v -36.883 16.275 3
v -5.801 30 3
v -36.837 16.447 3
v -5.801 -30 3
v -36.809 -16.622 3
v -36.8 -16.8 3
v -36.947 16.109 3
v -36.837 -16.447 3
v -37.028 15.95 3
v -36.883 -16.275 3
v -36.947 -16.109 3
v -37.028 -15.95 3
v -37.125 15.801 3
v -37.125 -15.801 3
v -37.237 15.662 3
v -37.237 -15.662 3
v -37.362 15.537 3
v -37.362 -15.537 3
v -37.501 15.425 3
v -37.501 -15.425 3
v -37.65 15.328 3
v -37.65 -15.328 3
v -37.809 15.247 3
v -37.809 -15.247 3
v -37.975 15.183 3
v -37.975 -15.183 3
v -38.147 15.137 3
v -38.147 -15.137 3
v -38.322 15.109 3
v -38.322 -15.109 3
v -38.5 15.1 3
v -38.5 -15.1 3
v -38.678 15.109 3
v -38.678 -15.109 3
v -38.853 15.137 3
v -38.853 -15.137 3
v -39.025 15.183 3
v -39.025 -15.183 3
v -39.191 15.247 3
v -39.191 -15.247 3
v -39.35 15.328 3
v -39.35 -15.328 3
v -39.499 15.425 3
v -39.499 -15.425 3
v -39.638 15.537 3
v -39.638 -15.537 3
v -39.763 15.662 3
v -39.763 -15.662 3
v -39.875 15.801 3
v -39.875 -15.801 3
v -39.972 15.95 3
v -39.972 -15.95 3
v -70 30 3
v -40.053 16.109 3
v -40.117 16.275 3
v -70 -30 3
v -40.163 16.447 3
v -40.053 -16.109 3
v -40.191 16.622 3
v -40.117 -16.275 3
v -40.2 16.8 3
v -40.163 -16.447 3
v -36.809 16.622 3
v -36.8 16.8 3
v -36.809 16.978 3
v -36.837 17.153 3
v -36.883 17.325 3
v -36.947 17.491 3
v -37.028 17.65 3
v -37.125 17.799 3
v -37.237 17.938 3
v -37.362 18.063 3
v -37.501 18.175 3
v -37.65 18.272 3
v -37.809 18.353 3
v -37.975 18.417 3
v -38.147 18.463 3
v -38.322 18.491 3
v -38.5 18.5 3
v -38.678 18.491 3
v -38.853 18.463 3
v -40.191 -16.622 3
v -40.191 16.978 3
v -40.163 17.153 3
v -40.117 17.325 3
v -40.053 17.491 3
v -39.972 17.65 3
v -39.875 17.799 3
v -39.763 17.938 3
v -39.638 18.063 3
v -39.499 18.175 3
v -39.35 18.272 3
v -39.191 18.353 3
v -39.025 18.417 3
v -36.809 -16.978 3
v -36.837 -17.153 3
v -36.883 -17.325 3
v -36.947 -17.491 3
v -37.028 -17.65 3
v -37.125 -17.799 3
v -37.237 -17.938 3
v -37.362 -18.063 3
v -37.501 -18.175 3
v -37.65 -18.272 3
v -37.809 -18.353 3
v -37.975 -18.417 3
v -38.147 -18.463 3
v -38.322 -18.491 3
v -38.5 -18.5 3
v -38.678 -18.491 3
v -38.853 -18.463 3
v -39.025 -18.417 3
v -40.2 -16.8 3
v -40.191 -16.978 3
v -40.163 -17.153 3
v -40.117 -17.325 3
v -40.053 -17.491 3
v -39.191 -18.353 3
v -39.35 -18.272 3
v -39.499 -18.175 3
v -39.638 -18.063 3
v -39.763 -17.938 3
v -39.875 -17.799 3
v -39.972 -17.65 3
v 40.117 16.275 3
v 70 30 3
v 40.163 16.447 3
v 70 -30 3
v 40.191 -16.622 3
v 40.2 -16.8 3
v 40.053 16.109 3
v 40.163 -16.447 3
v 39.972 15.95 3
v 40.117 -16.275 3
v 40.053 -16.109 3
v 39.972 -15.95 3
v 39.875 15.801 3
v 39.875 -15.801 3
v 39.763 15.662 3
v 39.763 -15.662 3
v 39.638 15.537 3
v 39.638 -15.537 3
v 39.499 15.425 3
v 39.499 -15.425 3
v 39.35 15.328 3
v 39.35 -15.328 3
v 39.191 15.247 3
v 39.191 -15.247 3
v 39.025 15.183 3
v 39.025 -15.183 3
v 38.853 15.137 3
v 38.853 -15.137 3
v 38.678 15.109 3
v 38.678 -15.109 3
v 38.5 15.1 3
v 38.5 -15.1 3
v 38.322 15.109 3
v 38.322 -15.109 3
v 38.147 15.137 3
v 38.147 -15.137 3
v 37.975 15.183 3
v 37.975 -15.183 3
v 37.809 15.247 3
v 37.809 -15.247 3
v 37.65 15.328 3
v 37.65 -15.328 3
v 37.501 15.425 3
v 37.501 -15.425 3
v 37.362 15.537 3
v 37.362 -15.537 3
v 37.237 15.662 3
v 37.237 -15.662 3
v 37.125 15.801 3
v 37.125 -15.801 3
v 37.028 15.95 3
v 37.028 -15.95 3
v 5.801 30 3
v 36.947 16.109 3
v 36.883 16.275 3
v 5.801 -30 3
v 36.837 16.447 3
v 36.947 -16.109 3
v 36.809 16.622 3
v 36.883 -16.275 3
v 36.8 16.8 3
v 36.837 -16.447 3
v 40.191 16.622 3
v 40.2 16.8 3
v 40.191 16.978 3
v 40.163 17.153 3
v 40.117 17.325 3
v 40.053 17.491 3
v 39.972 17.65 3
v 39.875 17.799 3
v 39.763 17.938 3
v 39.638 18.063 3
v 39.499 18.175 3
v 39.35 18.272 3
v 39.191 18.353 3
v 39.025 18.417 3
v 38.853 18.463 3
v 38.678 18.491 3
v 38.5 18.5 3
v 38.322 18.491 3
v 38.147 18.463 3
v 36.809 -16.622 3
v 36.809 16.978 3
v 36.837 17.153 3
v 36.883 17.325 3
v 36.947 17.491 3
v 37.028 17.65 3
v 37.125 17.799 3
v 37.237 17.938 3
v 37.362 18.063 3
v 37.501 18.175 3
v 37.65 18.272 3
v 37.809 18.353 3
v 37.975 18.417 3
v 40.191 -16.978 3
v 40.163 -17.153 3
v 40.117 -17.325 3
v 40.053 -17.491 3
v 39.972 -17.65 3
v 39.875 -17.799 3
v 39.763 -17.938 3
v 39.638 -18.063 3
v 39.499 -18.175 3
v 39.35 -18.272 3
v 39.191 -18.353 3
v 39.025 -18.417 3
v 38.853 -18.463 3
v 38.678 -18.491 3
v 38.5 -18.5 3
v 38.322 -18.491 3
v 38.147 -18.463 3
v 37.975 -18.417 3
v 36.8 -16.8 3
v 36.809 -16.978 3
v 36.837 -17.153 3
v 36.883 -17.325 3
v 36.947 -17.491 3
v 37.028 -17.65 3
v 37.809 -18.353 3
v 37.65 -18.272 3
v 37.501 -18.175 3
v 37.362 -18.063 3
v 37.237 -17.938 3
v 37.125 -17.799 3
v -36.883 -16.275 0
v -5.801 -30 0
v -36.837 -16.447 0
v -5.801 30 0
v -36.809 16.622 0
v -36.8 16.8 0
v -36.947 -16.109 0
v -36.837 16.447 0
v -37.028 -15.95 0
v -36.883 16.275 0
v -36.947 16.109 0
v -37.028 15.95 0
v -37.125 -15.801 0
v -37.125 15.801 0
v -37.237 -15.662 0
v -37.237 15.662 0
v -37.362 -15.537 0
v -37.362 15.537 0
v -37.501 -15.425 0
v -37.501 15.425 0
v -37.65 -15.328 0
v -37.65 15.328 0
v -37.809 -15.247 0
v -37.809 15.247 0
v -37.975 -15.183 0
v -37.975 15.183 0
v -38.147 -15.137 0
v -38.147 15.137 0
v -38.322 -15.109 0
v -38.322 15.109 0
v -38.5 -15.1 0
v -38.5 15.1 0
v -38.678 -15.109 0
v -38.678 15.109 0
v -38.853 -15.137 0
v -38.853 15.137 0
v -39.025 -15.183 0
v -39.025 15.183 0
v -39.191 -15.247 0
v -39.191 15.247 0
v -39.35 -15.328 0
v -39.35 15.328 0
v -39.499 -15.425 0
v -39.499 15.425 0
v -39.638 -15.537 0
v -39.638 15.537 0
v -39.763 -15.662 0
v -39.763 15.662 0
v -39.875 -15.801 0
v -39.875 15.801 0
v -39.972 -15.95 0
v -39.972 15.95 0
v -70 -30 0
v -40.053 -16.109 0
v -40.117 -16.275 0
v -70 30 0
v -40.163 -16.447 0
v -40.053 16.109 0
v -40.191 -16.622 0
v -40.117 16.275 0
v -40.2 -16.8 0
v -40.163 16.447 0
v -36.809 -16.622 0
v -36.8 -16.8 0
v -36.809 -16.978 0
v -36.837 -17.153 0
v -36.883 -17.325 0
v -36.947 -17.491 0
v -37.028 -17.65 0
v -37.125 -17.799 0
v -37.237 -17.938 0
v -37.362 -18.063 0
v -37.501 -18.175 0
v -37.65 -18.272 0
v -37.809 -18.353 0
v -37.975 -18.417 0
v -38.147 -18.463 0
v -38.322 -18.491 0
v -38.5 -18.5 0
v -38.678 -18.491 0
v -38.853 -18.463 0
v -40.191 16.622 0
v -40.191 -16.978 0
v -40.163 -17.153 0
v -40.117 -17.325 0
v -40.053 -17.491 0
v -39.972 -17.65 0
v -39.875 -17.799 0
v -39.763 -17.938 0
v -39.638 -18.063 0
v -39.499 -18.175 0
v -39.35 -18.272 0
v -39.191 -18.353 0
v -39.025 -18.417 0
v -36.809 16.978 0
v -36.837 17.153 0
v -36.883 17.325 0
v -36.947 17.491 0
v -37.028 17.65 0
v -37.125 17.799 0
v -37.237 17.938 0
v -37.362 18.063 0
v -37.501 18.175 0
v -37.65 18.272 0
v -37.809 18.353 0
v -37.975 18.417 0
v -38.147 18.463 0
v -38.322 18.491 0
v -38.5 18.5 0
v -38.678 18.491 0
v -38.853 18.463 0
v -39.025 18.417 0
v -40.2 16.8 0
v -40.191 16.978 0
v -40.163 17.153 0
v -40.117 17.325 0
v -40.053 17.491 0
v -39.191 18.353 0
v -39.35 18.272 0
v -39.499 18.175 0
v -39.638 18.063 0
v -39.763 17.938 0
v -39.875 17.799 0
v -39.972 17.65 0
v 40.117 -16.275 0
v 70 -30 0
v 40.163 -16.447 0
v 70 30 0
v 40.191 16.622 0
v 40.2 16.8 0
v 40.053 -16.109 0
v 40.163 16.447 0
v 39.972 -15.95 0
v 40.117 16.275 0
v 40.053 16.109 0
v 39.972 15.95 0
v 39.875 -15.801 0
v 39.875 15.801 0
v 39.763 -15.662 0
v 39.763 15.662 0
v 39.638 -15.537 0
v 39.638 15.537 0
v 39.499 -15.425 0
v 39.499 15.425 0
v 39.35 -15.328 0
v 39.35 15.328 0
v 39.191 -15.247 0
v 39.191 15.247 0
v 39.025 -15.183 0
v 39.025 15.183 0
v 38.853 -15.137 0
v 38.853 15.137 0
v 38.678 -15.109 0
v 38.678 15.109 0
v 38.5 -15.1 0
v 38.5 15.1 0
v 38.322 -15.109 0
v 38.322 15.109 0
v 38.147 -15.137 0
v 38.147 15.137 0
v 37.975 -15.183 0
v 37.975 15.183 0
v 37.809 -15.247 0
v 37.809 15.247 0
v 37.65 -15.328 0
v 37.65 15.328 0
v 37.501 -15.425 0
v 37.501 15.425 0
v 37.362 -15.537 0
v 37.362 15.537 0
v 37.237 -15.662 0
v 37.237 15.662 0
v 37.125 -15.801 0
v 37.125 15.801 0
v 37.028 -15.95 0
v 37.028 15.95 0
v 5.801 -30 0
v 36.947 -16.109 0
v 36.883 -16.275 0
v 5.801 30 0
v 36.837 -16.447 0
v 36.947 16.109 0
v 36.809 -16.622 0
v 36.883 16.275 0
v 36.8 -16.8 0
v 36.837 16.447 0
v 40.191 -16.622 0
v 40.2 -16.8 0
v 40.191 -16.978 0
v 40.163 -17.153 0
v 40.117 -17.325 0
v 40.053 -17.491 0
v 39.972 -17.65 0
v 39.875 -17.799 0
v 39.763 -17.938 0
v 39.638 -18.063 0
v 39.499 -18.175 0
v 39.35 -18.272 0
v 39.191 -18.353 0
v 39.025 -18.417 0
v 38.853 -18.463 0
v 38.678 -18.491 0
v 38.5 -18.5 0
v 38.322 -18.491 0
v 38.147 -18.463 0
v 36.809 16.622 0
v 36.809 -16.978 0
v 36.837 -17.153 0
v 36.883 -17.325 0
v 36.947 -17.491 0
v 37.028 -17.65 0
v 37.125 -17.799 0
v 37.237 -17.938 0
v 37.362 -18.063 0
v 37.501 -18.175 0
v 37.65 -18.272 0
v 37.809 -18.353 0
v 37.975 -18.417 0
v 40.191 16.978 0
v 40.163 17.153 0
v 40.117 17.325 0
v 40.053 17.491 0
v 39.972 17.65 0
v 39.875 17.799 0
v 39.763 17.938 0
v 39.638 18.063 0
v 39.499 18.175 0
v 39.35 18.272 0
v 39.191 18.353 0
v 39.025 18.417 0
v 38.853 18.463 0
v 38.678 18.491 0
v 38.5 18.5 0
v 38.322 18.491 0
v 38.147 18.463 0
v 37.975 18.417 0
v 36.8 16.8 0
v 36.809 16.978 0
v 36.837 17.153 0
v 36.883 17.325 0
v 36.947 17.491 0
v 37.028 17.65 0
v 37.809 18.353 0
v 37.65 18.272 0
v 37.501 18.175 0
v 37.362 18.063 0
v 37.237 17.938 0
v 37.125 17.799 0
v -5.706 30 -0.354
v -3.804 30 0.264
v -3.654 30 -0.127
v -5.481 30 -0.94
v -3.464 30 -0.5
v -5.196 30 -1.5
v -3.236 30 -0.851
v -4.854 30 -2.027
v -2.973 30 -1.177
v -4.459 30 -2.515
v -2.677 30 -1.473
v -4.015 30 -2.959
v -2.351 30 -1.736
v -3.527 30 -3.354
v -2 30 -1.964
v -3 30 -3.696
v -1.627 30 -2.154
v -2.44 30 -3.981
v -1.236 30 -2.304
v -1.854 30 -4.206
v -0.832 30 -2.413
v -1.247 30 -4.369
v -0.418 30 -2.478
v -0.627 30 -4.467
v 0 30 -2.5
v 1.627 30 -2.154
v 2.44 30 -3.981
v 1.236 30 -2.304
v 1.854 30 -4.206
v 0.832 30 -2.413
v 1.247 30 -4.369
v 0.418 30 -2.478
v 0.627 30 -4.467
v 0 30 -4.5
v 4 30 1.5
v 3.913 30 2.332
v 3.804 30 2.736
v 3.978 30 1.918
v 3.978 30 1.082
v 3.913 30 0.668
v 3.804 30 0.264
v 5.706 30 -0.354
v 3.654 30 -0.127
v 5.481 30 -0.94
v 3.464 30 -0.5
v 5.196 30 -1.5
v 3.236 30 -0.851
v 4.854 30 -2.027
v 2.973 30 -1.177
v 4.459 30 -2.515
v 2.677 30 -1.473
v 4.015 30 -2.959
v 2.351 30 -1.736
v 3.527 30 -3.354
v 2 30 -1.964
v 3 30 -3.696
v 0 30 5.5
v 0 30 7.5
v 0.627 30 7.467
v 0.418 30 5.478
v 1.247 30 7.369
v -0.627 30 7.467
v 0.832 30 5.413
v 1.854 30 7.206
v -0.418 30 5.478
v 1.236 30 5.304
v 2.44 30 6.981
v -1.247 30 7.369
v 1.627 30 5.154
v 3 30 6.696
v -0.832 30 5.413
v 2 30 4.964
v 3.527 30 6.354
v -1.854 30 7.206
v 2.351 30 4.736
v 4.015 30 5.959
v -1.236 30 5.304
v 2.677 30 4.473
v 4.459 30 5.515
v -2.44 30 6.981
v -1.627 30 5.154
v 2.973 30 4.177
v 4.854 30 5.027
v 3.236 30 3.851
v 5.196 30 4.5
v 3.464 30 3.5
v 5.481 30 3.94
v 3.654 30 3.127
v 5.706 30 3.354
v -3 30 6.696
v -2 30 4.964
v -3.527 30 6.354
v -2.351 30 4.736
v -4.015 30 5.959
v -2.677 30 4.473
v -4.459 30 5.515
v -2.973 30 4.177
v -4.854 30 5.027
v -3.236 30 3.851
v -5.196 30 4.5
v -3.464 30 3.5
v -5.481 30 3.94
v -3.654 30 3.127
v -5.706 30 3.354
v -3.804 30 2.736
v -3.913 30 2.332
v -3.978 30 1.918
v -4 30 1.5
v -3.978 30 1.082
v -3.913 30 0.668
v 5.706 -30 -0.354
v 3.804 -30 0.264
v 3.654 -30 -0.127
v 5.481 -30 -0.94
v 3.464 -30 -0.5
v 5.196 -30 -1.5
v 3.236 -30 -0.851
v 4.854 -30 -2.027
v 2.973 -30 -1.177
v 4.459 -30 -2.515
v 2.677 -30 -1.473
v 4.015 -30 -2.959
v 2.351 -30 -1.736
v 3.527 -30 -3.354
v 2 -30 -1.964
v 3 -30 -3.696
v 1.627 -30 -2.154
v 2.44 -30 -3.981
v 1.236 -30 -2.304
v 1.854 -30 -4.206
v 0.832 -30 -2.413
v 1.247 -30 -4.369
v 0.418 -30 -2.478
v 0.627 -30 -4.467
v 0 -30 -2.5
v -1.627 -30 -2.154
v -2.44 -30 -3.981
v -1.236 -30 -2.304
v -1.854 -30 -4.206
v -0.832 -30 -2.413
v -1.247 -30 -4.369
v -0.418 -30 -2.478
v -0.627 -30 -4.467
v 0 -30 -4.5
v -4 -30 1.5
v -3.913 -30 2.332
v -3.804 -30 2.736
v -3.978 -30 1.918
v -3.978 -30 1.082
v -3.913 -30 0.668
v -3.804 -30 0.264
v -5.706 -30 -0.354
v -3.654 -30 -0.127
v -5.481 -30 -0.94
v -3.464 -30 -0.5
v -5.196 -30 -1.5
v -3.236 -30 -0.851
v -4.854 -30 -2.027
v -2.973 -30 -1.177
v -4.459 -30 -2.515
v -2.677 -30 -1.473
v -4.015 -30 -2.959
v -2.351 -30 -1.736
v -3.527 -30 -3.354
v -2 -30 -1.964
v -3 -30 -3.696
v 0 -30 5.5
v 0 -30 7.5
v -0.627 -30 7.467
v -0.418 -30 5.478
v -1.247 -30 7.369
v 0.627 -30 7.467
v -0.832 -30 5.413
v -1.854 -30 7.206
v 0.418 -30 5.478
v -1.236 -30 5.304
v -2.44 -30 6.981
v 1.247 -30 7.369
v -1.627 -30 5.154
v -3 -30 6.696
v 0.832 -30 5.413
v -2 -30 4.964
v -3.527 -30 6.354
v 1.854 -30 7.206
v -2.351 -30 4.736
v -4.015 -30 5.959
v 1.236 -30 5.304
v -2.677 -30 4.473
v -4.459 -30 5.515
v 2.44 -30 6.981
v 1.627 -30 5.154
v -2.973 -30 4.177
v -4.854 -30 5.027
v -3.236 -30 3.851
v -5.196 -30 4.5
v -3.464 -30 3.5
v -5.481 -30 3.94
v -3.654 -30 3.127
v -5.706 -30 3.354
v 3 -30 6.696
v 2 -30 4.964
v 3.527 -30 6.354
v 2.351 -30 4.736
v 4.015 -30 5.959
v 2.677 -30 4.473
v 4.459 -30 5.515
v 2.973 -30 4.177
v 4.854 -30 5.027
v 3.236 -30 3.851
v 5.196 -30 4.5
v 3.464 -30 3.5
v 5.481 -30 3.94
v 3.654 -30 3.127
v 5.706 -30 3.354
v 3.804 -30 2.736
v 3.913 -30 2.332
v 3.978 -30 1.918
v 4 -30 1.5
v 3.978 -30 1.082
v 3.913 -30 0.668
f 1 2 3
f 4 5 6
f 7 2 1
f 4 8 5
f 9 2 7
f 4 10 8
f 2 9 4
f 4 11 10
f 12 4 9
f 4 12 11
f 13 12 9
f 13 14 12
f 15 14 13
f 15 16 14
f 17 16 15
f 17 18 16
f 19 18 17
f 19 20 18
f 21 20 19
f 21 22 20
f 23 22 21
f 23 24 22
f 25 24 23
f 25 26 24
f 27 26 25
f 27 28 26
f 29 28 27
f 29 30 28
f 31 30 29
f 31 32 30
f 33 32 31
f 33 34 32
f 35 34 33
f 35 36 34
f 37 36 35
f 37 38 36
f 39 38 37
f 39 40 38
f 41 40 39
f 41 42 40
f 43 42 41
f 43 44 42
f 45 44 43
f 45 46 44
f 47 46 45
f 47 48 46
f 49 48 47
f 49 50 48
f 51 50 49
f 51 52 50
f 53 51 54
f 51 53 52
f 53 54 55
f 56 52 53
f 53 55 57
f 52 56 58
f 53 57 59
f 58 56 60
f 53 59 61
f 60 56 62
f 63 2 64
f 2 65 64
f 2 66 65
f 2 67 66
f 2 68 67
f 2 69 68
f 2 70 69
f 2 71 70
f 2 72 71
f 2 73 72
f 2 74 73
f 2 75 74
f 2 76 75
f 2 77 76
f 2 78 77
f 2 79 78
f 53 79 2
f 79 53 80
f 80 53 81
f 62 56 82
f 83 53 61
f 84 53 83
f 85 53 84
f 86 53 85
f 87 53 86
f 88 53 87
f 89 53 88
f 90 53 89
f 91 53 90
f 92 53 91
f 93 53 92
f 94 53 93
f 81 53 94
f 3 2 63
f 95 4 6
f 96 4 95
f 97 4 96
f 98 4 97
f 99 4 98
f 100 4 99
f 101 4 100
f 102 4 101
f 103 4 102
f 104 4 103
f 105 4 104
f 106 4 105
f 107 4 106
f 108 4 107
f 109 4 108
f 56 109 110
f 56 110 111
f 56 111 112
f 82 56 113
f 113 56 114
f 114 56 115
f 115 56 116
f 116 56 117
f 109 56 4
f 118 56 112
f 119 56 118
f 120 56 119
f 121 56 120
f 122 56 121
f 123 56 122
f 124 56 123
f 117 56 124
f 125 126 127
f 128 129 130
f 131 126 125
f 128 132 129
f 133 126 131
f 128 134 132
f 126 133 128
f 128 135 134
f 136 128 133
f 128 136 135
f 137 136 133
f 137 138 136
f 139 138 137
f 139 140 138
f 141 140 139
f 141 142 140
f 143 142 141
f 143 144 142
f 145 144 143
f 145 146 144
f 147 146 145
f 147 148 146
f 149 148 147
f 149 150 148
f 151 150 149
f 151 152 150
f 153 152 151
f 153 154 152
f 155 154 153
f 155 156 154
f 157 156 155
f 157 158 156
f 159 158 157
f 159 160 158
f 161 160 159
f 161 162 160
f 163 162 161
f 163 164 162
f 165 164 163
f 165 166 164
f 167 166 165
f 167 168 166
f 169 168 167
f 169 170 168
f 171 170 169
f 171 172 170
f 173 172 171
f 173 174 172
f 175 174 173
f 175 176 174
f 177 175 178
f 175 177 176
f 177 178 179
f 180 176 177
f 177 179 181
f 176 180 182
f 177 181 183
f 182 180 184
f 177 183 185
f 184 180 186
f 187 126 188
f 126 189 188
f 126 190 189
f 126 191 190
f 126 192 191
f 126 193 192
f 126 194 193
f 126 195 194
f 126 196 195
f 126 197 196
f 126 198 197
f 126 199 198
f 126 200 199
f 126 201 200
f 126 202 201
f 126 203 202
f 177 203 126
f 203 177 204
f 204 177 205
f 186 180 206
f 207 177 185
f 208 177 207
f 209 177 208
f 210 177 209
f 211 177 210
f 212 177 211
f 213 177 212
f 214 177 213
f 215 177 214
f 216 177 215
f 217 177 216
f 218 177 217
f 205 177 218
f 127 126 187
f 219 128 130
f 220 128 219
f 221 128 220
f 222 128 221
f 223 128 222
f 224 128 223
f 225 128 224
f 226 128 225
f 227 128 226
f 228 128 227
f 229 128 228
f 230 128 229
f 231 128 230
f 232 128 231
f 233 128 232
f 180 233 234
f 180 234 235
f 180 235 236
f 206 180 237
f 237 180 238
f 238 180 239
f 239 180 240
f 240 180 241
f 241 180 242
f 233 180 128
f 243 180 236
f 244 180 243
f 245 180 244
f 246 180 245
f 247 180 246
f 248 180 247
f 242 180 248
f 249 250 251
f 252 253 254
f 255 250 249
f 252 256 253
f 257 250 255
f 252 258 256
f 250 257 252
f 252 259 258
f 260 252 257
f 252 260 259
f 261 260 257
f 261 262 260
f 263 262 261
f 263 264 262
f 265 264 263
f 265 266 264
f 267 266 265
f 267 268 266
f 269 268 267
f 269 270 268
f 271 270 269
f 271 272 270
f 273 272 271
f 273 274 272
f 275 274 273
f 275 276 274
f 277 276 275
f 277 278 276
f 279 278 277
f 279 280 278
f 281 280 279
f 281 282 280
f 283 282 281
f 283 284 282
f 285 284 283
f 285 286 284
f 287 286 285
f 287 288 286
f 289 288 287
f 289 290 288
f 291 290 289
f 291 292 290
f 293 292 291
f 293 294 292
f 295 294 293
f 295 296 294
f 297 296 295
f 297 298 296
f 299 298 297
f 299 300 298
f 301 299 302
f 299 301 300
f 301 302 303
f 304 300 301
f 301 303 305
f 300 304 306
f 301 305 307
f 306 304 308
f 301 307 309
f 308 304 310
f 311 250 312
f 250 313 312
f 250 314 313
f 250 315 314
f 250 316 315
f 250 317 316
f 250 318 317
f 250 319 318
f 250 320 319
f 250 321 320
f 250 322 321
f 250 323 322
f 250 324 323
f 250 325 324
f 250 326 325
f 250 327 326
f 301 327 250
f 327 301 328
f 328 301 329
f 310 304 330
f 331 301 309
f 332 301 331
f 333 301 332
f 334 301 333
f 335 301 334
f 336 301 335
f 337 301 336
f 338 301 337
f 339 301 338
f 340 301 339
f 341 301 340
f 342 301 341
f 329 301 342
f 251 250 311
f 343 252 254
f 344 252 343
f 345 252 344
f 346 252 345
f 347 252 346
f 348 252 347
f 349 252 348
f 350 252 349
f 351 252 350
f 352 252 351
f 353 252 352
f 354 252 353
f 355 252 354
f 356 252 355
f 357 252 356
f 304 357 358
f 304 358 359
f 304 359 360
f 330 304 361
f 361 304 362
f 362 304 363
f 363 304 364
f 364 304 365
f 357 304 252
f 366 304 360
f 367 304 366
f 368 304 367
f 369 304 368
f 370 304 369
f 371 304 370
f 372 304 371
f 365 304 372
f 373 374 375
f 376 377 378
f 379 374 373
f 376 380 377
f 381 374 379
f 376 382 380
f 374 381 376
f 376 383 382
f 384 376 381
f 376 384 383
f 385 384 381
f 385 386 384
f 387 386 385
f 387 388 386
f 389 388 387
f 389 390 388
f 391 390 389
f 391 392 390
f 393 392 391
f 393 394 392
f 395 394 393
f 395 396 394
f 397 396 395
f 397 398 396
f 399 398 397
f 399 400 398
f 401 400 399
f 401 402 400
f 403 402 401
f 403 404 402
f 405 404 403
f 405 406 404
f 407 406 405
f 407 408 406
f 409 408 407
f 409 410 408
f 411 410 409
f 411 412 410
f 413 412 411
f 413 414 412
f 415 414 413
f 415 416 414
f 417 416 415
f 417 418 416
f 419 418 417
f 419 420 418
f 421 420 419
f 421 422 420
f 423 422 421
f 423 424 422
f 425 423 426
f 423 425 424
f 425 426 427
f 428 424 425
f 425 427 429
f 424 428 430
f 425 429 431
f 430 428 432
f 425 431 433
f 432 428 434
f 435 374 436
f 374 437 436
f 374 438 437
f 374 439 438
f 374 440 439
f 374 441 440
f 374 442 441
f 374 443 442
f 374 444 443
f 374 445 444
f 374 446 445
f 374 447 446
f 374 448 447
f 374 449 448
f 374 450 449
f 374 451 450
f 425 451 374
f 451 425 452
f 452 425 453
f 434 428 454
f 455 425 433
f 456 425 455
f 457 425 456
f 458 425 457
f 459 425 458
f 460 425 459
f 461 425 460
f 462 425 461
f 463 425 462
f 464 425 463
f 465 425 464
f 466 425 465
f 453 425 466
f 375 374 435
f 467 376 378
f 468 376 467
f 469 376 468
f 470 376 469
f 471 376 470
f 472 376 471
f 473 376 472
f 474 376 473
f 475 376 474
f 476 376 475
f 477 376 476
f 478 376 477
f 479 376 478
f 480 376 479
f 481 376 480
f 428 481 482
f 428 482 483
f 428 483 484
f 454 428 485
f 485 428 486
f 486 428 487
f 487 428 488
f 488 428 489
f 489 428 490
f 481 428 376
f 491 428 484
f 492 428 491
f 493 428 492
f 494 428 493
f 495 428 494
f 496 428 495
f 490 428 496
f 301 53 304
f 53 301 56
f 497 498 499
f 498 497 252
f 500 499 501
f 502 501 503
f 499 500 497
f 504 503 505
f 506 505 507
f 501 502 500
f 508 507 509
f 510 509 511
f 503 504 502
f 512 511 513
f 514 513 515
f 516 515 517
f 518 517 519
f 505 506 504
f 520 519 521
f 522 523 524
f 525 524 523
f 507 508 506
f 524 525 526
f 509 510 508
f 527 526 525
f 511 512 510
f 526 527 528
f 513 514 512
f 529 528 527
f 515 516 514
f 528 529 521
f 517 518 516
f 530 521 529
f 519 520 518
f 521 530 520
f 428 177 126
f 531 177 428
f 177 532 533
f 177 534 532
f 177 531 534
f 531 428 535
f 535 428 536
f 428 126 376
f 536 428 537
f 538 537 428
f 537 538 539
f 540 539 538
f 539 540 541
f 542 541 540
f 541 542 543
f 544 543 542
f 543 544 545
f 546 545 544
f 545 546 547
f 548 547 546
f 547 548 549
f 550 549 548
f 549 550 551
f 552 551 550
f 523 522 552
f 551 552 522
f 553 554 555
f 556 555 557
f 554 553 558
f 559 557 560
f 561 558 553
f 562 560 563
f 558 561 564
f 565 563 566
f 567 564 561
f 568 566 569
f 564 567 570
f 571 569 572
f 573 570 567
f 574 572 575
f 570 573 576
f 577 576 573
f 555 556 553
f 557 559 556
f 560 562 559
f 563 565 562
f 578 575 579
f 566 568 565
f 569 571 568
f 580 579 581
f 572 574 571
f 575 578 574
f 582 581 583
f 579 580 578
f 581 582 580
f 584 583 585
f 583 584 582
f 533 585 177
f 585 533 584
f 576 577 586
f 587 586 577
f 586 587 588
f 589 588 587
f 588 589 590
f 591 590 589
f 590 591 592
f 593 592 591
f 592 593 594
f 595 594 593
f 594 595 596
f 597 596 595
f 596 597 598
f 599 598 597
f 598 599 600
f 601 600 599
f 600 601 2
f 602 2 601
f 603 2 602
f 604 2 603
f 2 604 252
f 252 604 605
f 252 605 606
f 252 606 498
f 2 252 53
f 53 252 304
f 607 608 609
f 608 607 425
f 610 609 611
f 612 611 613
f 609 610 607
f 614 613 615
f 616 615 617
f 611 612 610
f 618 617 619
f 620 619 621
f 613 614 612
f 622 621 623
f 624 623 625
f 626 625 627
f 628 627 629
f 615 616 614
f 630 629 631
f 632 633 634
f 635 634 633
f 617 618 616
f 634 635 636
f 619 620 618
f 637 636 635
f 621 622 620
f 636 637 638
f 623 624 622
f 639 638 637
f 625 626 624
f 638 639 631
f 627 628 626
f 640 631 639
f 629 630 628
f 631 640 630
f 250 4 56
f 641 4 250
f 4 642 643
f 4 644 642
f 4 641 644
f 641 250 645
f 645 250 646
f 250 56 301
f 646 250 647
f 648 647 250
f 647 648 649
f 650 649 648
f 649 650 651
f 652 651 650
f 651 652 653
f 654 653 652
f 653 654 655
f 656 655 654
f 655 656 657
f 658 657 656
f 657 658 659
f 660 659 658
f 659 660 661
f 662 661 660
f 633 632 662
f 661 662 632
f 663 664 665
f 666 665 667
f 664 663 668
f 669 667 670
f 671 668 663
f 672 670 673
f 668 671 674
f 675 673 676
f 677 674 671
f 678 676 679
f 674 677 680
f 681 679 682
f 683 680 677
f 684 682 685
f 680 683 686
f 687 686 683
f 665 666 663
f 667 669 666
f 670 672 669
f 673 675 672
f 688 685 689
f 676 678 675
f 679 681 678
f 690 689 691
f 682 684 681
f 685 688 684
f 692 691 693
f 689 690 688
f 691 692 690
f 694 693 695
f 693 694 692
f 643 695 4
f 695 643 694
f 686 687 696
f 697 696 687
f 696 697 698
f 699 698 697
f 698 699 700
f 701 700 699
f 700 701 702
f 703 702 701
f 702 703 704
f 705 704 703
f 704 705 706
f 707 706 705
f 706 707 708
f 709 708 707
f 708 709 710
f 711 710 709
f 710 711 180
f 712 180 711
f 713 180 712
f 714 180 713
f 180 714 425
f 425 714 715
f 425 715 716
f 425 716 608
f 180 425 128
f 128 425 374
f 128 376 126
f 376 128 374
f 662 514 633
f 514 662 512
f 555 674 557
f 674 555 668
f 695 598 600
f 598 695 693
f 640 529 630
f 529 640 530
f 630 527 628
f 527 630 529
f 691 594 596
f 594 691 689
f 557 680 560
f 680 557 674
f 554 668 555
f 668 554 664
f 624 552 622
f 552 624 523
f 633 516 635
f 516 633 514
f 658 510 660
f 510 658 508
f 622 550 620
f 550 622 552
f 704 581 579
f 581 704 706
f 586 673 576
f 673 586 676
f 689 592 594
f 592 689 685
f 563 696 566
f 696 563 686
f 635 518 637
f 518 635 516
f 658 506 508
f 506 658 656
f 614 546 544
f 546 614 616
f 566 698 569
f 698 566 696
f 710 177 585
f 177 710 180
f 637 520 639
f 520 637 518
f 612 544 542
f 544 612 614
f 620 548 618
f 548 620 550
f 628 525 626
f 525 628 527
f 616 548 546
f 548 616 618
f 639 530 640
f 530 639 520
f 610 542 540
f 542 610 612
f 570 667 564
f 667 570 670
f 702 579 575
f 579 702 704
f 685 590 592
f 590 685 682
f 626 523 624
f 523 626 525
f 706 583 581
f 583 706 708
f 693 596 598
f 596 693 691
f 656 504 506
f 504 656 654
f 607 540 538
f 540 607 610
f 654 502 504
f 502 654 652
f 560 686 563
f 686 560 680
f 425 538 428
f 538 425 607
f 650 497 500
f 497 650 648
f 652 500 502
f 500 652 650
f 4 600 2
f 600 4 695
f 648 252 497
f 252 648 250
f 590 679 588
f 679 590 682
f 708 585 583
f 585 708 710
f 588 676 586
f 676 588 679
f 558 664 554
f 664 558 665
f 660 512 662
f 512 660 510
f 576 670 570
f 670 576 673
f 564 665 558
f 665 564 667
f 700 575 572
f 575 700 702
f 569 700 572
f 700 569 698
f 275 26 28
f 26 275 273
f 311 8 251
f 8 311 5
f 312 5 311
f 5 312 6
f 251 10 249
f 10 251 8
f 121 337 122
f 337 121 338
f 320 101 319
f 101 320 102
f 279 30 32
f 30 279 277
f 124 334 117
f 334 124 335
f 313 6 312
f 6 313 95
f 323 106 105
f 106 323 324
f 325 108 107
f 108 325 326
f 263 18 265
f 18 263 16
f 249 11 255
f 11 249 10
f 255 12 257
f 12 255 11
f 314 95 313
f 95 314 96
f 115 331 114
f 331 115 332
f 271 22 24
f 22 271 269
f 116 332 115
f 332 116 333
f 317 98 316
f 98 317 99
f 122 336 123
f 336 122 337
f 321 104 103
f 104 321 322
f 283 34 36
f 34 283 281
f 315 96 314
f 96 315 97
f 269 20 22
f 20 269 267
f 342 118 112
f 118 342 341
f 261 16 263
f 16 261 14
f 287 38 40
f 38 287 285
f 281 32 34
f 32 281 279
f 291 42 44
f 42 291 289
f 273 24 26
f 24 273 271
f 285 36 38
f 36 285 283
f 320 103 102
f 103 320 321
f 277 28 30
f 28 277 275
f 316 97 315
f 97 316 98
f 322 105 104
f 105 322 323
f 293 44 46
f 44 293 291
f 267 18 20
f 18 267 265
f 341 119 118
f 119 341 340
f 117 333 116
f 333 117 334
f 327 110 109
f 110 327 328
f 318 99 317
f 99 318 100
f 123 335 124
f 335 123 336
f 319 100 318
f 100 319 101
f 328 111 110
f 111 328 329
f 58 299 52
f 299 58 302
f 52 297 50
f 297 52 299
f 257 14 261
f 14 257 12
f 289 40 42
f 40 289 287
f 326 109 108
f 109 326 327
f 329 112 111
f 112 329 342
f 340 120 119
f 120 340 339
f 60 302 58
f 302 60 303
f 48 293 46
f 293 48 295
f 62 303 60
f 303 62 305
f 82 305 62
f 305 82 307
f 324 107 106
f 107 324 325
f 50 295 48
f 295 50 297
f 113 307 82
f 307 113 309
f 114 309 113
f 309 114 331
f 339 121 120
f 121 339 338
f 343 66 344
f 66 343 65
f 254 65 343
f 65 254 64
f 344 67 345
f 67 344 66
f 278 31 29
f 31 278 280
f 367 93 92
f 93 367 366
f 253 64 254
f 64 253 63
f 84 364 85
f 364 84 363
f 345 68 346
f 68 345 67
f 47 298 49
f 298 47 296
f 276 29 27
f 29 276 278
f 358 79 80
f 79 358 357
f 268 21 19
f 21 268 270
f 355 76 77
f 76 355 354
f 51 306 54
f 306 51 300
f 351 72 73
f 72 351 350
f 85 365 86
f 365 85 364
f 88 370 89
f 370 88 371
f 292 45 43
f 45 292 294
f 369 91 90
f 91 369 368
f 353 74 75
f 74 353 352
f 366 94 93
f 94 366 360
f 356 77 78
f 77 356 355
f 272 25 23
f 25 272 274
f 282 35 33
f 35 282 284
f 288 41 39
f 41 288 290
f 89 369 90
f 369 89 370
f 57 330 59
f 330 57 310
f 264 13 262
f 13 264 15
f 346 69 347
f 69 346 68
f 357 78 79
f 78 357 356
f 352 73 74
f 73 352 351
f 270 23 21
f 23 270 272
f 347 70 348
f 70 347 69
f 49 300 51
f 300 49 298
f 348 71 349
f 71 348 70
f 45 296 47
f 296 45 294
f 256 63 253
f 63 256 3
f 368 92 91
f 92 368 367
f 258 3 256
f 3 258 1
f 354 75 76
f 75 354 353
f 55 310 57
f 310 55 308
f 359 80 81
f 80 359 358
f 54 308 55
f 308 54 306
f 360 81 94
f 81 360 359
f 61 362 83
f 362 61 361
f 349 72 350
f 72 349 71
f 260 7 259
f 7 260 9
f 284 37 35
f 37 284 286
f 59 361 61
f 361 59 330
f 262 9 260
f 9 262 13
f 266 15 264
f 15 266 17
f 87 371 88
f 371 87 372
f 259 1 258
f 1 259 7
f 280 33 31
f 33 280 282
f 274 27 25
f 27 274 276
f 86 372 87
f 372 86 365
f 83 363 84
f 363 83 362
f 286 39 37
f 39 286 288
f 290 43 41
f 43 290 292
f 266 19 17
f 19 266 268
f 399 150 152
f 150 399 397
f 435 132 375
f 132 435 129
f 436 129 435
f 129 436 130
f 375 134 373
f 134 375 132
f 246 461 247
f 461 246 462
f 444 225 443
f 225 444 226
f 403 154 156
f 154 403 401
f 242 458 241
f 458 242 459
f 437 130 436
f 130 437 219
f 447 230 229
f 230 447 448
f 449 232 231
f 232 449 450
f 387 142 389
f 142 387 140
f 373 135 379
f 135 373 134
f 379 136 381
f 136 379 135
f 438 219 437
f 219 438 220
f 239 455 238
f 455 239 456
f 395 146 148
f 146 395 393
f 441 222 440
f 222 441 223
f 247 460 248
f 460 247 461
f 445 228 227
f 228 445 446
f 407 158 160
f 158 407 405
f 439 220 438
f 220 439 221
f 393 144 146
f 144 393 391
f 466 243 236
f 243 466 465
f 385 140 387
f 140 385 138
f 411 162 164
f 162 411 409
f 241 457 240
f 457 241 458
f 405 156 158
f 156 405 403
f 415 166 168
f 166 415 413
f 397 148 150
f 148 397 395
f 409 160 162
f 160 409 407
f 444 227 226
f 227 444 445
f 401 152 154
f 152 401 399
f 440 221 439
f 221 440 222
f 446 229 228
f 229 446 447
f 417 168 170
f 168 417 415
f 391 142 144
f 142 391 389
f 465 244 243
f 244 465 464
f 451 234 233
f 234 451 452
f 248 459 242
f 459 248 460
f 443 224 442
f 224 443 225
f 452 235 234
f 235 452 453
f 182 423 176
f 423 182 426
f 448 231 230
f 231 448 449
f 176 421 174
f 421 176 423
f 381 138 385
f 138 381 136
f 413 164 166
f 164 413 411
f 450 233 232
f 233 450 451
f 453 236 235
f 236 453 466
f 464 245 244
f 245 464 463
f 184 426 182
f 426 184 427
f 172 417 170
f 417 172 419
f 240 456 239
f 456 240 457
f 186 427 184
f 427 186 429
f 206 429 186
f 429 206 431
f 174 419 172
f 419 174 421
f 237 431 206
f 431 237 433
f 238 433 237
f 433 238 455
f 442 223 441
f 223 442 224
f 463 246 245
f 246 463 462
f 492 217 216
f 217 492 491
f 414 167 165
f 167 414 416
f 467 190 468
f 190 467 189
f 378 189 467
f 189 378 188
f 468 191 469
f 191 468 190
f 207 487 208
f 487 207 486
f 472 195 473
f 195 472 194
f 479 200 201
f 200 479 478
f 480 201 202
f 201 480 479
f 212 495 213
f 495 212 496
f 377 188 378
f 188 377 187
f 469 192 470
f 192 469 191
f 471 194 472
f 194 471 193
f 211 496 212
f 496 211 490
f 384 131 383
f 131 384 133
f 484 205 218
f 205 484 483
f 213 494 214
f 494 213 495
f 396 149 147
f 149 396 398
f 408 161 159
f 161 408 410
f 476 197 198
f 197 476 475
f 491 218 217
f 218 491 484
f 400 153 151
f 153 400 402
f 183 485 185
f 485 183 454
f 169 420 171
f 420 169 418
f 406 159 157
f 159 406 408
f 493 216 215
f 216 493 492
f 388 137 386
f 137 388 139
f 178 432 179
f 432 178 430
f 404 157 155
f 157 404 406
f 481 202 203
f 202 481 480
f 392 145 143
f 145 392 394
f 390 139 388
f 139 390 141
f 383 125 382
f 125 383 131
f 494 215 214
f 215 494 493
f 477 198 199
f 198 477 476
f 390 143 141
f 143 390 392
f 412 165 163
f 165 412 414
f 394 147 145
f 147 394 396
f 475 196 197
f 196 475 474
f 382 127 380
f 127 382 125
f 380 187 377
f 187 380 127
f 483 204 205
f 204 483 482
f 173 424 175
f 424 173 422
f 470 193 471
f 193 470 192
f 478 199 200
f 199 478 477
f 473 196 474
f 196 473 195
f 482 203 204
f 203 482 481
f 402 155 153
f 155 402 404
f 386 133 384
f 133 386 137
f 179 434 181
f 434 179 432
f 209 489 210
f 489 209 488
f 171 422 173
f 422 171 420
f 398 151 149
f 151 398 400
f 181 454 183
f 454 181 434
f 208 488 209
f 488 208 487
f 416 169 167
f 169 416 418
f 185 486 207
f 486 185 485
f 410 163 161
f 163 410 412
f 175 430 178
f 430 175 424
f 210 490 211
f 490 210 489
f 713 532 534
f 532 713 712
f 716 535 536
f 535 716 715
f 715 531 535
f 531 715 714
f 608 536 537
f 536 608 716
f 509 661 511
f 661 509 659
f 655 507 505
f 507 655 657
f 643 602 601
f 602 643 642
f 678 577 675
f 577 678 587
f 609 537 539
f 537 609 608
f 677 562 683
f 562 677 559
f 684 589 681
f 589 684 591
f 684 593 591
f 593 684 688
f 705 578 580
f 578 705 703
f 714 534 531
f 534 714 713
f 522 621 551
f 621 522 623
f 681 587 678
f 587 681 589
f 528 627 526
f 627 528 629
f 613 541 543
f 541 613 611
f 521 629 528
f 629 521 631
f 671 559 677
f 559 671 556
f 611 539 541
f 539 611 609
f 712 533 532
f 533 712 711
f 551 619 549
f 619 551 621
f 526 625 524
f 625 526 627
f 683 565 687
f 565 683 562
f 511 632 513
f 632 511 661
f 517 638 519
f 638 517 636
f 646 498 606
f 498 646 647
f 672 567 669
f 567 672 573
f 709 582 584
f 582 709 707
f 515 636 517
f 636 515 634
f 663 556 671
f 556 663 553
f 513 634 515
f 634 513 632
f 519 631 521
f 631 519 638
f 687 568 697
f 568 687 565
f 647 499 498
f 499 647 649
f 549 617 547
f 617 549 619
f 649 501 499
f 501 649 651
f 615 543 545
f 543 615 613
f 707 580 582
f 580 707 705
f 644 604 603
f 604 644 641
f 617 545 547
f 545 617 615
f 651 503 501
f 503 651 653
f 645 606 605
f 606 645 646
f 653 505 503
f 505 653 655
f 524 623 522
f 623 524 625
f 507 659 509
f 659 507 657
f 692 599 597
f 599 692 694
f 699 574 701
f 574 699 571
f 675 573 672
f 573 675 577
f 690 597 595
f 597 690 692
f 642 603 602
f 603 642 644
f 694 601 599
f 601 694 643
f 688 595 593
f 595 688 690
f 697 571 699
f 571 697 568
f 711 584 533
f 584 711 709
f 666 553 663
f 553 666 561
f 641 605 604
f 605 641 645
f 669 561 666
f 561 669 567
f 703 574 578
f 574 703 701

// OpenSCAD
// Two-leaf hinge with a printable straight pin barrel.
$fn = 60;
eps = 0.02;
leaf_l = 70;
leaf_w = 60;
leaf_t = 3;
pin_d = 8;
barrel_d = pin_d + 4;
difference() {
    union() {
        translate([-leaf_l, -leaf_w / 2, 0]) cube([leaf_l, leaf_w, leaf_t]);
        translate([0, -leaf_w / 2, 0]) cube([leaf_l, leaf_w, leaf_t]);
        translate([0, -leaf_w / 2, leaf_t / 2]) rotate([-90, 0, 0]) cylinder(d = barrel_d, h = leaf_w);
    }
    translate([0, -leaf_w / 2 - eps, leaf_t / 2]) rotate([-90, 0, 0]) cylinder(d = pin_d, h = leaf_w + 2 * eps);
    for (x = [-leaf_l * 0.55, leaf_l * 0.55], y = [-leaf_w * 0.28, leaf_w * 0.28])
        translate([x, y, -eps]) cylinder(d = 3.4, h = leaf_t + 2 * eps);
}
